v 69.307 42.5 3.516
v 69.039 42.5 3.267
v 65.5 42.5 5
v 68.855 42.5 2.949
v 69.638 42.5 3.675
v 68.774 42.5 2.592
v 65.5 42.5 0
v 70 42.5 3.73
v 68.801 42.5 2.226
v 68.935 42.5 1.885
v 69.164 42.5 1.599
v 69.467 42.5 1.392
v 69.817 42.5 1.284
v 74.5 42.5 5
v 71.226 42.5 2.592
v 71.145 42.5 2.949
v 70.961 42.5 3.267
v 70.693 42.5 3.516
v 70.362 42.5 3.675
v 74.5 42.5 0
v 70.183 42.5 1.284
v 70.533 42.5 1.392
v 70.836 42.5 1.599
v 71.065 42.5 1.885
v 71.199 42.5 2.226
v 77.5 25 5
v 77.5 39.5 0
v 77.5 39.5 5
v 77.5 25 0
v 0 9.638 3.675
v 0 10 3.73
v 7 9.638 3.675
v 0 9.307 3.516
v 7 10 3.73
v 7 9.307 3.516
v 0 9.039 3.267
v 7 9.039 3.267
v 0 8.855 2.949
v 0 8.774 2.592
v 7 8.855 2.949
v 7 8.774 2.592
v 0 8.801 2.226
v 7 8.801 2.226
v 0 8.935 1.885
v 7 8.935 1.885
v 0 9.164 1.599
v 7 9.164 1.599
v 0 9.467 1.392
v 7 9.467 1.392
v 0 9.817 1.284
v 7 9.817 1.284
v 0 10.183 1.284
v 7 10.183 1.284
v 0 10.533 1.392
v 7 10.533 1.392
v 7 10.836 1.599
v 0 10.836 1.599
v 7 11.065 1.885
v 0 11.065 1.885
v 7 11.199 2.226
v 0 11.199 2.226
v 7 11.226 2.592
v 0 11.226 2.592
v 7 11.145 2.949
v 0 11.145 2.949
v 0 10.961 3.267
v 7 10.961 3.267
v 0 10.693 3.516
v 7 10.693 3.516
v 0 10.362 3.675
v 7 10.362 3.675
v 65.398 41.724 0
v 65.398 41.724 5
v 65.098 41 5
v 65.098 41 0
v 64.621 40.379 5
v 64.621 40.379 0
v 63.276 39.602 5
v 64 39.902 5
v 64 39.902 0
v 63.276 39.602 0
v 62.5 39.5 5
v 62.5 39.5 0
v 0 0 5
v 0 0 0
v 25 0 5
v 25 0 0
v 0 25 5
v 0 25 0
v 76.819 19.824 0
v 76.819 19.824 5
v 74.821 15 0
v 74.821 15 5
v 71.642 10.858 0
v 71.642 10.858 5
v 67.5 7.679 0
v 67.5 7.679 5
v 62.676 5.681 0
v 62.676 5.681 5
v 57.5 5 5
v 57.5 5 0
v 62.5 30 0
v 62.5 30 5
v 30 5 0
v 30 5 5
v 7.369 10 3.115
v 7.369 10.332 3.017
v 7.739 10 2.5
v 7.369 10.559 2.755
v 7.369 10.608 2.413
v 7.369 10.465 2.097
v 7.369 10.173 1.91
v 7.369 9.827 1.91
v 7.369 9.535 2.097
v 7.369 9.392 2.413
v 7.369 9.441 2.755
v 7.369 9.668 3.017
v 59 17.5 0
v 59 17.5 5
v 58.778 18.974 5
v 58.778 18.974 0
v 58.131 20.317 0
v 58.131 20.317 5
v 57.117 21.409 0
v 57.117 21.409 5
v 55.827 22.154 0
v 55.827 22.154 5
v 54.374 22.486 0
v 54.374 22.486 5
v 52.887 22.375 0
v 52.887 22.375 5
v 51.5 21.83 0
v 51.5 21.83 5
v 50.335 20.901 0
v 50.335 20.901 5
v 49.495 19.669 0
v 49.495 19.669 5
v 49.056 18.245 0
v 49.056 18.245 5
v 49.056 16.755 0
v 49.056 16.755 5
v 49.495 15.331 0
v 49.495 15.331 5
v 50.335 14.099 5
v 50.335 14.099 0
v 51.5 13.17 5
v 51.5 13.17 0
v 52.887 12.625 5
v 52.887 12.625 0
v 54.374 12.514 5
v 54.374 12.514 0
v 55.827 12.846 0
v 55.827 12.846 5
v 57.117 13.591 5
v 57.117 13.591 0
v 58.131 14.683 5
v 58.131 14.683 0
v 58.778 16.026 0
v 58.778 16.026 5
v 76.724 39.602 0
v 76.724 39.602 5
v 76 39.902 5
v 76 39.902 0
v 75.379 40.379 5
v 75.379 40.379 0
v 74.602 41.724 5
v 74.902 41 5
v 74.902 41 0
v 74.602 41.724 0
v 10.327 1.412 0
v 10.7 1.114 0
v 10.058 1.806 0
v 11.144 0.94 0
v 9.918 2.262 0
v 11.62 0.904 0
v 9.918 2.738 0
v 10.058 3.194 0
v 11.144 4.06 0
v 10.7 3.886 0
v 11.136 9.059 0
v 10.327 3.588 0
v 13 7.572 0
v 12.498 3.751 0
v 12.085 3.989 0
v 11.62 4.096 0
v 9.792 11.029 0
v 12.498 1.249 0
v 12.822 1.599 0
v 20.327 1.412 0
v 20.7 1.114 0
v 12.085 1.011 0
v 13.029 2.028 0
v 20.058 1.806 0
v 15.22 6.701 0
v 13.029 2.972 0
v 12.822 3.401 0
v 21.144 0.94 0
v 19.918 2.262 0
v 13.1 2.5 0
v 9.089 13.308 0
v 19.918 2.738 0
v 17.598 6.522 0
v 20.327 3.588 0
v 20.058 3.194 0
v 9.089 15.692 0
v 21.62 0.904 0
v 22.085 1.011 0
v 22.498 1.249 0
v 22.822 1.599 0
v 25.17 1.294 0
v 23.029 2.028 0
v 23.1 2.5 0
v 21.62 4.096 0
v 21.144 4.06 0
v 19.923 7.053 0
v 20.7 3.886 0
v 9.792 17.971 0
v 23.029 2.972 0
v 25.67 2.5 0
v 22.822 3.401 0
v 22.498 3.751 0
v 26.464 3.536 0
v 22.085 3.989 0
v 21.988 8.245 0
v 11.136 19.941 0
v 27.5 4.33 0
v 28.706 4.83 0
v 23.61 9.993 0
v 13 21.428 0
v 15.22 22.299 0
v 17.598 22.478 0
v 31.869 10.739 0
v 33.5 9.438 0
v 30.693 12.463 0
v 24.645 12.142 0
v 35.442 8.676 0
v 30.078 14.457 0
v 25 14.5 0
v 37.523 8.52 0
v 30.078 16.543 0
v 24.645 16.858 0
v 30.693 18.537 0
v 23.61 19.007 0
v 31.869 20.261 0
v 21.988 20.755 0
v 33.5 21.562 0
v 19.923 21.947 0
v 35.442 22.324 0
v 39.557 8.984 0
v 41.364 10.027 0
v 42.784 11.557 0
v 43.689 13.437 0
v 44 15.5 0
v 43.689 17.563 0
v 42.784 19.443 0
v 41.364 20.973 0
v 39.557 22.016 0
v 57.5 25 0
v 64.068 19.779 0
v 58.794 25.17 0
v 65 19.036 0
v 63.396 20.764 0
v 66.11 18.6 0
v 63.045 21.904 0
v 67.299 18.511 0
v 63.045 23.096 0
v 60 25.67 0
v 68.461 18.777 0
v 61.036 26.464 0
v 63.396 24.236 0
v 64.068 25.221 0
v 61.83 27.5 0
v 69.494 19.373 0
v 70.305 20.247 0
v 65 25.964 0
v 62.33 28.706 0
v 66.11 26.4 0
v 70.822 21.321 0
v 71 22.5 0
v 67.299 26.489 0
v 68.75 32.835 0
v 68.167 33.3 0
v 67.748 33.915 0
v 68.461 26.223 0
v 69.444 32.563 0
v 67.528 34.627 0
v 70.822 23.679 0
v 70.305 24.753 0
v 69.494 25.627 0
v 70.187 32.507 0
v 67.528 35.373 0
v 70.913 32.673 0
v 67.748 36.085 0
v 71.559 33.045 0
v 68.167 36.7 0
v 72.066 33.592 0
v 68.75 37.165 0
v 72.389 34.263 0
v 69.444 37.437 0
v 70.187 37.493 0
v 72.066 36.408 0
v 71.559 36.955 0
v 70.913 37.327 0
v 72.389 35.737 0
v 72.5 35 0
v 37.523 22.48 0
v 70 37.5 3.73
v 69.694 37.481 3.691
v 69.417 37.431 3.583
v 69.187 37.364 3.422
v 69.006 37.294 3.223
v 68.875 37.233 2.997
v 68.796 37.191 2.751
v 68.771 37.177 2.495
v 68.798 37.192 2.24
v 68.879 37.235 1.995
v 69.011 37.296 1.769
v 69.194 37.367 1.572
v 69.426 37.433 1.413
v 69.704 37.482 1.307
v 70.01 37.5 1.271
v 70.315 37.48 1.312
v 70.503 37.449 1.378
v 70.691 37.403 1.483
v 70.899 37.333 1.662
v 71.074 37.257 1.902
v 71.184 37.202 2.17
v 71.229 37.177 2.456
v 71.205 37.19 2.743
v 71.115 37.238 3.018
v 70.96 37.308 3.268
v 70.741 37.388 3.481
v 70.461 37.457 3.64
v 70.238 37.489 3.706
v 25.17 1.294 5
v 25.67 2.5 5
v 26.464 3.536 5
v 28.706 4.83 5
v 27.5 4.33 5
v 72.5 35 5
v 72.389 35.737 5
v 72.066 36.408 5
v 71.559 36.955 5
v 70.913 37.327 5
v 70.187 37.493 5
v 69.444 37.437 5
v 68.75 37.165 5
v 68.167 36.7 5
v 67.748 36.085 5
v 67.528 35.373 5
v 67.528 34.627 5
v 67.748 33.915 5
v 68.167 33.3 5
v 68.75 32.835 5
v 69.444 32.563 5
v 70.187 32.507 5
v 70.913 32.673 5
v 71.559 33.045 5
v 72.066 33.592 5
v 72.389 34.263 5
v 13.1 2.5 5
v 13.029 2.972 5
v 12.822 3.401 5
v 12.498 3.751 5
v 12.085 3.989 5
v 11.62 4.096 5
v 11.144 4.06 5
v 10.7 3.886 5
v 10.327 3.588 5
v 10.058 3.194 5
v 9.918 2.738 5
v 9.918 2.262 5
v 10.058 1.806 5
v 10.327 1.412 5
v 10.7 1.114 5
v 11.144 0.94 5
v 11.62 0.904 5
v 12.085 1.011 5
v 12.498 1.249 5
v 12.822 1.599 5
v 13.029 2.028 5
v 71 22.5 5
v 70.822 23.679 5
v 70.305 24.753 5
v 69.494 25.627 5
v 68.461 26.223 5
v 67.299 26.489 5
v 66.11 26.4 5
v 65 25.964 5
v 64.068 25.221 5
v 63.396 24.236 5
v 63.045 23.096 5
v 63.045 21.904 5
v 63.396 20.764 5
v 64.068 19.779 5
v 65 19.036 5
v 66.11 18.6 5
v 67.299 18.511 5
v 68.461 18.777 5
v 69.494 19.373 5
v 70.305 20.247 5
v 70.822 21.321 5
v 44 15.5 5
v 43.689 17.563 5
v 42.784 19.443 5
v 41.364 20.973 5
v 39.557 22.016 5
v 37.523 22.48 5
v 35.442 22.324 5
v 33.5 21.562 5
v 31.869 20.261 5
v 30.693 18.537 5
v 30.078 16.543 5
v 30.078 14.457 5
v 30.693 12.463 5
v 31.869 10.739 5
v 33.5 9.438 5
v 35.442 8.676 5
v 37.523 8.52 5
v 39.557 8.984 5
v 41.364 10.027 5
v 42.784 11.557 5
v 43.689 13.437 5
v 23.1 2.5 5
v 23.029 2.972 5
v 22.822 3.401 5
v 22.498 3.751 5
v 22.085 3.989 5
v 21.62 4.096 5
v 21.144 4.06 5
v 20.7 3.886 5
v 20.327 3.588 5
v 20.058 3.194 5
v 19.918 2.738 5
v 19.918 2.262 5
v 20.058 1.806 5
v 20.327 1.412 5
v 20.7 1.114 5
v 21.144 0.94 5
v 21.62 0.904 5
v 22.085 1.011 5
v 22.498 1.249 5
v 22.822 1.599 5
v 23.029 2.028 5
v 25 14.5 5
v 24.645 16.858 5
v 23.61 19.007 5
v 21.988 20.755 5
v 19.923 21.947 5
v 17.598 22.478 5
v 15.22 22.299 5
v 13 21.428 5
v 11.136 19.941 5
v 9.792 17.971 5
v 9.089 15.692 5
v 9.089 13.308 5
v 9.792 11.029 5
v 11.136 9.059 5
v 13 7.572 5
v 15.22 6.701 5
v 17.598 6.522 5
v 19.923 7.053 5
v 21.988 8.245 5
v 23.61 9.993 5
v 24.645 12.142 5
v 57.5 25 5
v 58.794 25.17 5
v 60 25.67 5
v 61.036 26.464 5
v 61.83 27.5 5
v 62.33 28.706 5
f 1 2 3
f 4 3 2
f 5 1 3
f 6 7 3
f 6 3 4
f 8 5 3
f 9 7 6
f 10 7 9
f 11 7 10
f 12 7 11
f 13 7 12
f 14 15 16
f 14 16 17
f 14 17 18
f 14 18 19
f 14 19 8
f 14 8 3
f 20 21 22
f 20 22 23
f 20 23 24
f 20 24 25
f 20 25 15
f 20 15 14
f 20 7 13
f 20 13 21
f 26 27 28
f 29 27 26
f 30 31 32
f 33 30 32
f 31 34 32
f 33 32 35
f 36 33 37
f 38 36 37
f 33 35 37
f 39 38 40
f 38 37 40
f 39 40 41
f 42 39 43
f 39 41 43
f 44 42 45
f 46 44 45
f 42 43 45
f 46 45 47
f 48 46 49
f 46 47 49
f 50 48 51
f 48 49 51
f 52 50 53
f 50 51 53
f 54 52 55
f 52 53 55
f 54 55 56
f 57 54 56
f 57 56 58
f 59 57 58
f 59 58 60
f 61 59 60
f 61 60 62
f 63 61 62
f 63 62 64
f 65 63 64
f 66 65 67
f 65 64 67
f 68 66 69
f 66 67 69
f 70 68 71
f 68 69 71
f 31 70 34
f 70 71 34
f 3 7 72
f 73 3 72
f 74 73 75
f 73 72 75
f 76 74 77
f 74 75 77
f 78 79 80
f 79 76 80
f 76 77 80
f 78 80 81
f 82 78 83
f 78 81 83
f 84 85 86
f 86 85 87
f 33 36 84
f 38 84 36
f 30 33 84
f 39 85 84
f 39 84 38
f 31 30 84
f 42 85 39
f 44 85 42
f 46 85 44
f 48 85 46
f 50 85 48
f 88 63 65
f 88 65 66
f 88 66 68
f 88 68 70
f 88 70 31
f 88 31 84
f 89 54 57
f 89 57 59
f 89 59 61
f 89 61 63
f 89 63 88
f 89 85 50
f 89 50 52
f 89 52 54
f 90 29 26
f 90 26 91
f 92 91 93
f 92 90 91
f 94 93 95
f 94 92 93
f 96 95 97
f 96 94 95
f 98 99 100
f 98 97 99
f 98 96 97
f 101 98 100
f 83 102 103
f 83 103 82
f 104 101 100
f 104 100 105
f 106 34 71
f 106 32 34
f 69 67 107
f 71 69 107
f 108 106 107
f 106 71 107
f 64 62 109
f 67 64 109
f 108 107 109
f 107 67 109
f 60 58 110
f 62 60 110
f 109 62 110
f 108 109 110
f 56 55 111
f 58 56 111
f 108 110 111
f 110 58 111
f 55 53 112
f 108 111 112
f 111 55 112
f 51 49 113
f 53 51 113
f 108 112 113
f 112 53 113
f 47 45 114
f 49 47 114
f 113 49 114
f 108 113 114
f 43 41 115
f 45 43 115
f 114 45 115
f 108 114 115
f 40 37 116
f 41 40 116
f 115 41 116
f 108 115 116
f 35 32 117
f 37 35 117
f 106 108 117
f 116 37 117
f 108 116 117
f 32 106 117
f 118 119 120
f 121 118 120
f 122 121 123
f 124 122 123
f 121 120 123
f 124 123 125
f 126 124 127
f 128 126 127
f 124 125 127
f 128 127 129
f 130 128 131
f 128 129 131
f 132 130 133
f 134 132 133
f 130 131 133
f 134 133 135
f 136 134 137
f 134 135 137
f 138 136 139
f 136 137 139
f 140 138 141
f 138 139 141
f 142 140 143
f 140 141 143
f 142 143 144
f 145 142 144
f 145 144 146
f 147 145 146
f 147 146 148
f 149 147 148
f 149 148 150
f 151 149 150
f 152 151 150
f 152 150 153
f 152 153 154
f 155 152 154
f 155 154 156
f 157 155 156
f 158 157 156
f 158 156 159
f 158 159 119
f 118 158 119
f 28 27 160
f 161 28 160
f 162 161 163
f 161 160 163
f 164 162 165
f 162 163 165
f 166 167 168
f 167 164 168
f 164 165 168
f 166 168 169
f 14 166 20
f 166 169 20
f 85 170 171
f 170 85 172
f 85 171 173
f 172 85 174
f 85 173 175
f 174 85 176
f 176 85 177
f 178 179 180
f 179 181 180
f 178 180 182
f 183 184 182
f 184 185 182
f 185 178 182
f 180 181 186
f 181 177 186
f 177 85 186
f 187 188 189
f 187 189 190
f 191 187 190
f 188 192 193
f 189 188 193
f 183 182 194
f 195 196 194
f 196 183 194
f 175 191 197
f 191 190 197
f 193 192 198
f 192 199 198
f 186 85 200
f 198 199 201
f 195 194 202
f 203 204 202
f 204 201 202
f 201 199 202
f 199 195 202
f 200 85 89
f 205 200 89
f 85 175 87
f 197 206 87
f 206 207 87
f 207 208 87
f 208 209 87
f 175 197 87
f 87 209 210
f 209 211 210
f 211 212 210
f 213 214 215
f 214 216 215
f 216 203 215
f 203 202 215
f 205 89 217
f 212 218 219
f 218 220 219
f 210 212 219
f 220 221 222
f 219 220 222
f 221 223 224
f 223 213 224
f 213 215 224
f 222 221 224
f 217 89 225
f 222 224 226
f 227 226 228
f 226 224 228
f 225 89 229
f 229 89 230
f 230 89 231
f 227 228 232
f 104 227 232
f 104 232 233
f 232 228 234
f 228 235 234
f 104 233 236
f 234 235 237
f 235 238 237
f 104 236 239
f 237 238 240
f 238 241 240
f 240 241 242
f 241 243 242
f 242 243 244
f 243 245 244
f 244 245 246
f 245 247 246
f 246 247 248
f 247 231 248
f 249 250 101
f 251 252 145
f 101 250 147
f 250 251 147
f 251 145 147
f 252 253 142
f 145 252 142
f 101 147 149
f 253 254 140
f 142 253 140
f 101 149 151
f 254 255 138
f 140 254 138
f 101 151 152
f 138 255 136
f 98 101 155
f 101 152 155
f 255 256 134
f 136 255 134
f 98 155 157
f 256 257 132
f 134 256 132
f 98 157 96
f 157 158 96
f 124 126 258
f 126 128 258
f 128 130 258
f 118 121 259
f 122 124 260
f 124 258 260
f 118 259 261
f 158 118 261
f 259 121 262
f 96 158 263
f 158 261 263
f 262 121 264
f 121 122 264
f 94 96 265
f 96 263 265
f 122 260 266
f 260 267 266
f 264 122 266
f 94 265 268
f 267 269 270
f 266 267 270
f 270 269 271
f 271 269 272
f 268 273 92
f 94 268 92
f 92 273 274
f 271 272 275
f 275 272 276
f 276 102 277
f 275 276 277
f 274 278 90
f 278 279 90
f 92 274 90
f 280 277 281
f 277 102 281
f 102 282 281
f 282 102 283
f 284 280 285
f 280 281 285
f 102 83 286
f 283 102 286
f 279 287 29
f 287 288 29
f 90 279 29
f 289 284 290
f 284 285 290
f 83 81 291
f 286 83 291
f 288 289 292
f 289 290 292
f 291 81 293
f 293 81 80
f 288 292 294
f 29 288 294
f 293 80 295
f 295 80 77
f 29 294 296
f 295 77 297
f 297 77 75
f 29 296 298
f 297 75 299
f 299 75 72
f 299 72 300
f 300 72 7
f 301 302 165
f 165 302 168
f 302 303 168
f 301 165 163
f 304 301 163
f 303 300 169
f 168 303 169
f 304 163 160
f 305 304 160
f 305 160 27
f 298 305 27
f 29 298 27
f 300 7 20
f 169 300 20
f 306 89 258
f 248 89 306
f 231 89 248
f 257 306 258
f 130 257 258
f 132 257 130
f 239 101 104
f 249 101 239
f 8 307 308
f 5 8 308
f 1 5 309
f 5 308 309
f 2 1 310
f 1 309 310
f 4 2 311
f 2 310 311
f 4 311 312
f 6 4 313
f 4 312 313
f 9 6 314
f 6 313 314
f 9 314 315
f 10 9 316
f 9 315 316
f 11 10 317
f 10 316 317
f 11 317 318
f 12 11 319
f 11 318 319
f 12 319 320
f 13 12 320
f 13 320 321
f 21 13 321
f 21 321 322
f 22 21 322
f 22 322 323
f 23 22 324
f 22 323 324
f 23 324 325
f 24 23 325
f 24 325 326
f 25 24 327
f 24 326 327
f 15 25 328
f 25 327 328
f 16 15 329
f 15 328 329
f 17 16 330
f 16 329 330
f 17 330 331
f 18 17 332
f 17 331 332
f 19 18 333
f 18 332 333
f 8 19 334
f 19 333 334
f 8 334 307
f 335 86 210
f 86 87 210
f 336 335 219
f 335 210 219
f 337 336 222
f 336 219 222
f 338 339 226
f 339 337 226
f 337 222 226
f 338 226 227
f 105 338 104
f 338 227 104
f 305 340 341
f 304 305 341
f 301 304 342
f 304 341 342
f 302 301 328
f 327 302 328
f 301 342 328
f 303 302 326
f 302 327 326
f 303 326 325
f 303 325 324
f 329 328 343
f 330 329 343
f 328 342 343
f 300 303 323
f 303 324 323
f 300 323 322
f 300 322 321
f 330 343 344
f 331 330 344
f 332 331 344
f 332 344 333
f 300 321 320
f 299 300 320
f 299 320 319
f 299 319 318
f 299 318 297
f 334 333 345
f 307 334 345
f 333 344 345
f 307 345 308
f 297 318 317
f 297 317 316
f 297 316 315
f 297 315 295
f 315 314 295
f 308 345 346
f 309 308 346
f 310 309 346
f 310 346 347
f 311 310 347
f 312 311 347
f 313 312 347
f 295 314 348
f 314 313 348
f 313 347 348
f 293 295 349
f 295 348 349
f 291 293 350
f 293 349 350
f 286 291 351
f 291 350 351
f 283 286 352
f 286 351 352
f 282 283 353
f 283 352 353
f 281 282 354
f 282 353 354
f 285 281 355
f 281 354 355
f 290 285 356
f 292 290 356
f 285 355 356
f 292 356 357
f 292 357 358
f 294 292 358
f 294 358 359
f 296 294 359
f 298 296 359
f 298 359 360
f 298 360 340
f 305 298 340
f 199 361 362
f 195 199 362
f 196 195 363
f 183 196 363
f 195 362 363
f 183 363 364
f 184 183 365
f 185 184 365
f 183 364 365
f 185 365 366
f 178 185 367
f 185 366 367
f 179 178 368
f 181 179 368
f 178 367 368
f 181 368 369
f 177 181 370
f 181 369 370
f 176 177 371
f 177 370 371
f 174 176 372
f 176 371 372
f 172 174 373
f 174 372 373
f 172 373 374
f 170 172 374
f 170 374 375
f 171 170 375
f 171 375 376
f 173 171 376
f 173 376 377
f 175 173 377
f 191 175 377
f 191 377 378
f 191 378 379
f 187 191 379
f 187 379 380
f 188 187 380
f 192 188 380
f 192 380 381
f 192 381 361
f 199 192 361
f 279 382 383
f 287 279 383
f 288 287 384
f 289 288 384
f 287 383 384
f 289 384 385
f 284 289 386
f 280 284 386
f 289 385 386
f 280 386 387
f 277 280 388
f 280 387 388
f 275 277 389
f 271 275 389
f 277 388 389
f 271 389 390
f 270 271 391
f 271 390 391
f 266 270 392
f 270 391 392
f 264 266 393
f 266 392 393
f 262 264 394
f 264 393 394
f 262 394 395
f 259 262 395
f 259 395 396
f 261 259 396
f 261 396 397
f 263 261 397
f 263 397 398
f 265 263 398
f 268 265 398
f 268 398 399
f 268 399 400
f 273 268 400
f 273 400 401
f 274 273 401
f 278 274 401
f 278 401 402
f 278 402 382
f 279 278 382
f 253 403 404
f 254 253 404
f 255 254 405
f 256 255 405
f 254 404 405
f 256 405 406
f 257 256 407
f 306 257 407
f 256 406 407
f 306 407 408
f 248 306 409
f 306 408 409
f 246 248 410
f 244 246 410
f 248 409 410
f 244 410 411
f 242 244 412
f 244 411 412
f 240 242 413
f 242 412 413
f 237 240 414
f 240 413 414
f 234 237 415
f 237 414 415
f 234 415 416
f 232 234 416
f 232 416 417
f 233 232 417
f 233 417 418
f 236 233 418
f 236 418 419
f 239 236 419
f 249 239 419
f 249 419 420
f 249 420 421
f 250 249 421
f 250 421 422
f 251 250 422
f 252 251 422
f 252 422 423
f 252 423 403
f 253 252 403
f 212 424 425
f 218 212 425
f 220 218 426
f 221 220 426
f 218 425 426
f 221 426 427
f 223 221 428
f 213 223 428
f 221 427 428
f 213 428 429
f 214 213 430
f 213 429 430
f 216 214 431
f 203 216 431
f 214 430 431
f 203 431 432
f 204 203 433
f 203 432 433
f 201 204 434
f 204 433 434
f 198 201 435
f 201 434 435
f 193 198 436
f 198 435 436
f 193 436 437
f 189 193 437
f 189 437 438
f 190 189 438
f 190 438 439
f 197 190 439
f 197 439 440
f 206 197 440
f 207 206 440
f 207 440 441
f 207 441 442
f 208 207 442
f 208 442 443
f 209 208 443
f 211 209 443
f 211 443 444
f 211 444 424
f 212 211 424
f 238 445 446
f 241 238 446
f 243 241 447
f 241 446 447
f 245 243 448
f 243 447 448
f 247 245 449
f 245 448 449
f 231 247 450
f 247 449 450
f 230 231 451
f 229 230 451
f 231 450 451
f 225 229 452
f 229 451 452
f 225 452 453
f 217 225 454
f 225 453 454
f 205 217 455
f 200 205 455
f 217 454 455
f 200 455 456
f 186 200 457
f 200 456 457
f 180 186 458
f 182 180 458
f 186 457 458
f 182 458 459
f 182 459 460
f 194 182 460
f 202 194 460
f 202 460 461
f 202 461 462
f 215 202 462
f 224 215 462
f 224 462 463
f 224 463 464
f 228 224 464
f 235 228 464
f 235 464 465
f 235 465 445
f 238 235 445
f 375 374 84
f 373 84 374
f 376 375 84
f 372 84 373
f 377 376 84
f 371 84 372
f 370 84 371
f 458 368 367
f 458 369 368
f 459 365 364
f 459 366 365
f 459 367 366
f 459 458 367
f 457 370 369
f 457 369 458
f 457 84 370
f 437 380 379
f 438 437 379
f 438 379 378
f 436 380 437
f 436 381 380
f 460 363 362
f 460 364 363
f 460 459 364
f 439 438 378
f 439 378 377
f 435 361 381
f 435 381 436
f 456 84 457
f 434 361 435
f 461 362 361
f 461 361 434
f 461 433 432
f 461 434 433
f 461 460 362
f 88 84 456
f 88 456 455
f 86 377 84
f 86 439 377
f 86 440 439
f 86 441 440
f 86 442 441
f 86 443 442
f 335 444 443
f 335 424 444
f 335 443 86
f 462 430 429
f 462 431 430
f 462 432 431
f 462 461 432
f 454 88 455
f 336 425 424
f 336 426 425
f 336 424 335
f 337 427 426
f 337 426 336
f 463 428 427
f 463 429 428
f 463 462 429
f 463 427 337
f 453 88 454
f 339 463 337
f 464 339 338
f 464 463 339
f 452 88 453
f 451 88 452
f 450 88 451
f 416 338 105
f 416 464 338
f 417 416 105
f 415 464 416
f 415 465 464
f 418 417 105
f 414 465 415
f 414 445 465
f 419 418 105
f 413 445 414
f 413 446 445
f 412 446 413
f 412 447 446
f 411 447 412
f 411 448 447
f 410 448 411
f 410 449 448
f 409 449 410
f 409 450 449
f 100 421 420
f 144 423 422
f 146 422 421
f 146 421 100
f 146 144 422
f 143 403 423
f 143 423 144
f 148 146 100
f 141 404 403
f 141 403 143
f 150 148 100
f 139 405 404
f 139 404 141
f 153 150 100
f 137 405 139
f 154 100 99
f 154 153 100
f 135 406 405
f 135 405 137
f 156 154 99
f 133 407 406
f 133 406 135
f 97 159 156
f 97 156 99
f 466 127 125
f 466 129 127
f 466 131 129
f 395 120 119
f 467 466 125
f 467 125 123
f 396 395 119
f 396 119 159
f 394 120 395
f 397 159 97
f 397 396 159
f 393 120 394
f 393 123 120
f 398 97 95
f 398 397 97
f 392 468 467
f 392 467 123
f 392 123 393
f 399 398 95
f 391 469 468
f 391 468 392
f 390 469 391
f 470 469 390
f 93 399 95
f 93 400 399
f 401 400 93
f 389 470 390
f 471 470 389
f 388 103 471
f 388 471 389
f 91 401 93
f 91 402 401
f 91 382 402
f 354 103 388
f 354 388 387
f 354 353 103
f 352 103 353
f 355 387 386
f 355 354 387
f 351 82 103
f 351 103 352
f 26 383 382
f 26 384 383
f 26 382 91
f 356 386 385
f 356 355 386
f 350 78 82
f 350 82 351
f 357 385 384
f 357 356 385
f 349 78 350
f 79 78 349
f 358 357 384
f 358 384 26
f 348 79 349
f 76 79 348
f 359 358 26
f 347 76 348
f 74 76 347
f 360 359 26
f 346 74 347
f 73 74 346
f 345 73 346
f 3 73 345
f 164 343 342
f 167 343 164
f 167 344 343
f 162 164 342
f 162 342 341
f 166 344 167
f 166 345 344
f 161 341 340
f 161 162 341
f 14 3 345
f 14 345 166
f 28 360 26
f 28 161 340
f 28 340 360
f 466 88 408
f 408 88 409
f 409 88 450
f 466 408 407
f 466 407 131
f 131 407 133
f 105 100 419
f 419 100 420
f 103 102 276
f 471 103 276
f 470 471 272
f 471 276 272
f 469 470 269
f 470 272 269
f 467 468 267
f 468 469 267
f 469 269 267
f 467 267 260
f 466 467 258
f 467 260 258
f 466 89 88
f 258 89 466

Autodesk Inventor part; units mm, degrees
ref_plane "YZ Plane" through (0, 0, 0) normal (1, 0, 0) x (0, 1, 0)
ref_plane "XZ Plane" through (0, 0, 0) normal (0, 1, 0) x (-1, 0, 0)
ref_plane "XY Plane" through (0, 0, 0) normal (0, 0, 1) x (1, 0, 0)
sketch "Skizze1" plane through (0, 0, 0) normal (0, 0, 1) x (1, 0, 0)
  line L0 (-16.3284, 0) -> (97.9706, 0) projected
  line L1 (0, -8.5) -> (0, 51) projected
  line L2 (0, 0) -> (0, 25)
  line L3 (0, 25) -> (57.5, 25)
  line L4 (62.5, 30) -> (62.5, 39.5)
  line L5 (77.5, 39.5) -> (77.5, 25)
  line L6 (57.5, 5) -> (30, 5)
  line L7 (25, 0) -> (25, 0)
  arc A0 (57.5, 5) -> (77.5, 25) centre (57.5, 25) ccw
  arc A1 (57.5, 25) -> (62.5, 30) centre (57.5, 30) ccw
  arc A2 (30, 5) -> (25, 0) centre (30, 0) ccw
  arc A3 (62.5, 39.5) -> (65.5, 42.5) centre (62.5, 42.5) ccw
  arc A4 (74.5, 42.5) -> (77.5, 39.5) centre (77.5, 42.5) ccw
  line L8 (65.5, 42.5) -> (74.5, 42.5)
  point P0 (62.5, 25)
  point P1 (77.5, 5)
  point P2 (25, 5)
  dimension "d0" = 77.5
  dimension "d3" = 25
  dimension "d4" = 5
  dimension "d5" = 25
  dimension "d11" = 20
  dimension "d12" = 5
  dimension "d19" = 15
  dimension "d21" = 42.5
  dimension "d22" = 3
  dimension "d23" = 3
extrude "Grundkörper" add sketch "Skizze1" along normal blind 5
sketch "Skizze2" plane through (0, 0, 5) normal (0, 0, 1) x (1, 0, 0)
  line L0 (0, -8.5) -> (0, 51) projected
  line L1 (-15.5, 0) -> (93, 0) projected
  line L2 (30, 5) -> (57.5, 5) projected
  circle A0 centre (11.5, 2.5) radius 1.6
  circle A1 centre (17, 14.5) radius 8
  circle A2 centre (21.5, 2.5) radius 1.6
  circle A3 centre (37, 15.5) radius 7
  circle A4 centre (54, 17.5) radius 5
  circle A5 centre (67, 22.5) radius 4
  circle A6 centre (70, 35) radius 2.5
  point P0 (0, 0)
  dimension "d24" = 11.5
  dimension "d25" = 10
  dimension "d26" = 2.5
  dimension "d27" = 2.5
  dimension "d28" = 14.5
  dimension "d29" = 17
  dimension "d30" = 10.5
  dimension "d31" = 37
  dimension "d32" = 12.5
  dimension "d33" = 54
  dimension "d34" = 17.5
  dimension "d35" = 67
  dimension "d36" = 70
  dimension "d37" = 35
  dimension "d38" = 16
  dimension "d39" = 3.2
  dimension "d40" = 3.2
  dimension "d41" = 14
  dimension "d42" = 10
  dimension "d43" = 8
  dimension "d44" = 5
extrude "Extrusion2" cut sketch "Skizze2" against normal through all
sketch "Skizze3" plane through (0, 0, 0) normal (-1, 0, 0) x (0, 0, 1)
  line L0 (0, -8.5) -> (0, 51) projected
  line L1 (-1, 0) -> (6, 0) projected
  point P0 (0, 0)
  point P1 (2.5, 10)
  dimension "d47" = 10
  dimension "d48" = 2.5
hole "Bohrung1" at (0, 10, 2.5) direction (1, 0, 0) diameter 2.459 depth 7 tip angle 118 thread size "M3x0.5" class "6H" standard "ISO Metric profile"
sketch "Skizze4" plane through (65.5, 42.5, 0) normal (0, 1, 0) x (1, 0, 0)
  line L0 (-81, 0) -> (27.5, 0) projected
  line L1 (12, 0) -> (12, -5) projected
  point P0 (-65.5, 0)
  point P1 (4.5, -2.5)
  dimension "d56" = 7.5
  dimension "d57" = 2.5
hole "Bohrung2" at (70, 42.5, 2.5) direction (0, -1, 0) diameter 2.459 end up to surface thread size "M3x0.5" class "6H" standard "ISO Metric profile"
properties part number "Lagerarm"
